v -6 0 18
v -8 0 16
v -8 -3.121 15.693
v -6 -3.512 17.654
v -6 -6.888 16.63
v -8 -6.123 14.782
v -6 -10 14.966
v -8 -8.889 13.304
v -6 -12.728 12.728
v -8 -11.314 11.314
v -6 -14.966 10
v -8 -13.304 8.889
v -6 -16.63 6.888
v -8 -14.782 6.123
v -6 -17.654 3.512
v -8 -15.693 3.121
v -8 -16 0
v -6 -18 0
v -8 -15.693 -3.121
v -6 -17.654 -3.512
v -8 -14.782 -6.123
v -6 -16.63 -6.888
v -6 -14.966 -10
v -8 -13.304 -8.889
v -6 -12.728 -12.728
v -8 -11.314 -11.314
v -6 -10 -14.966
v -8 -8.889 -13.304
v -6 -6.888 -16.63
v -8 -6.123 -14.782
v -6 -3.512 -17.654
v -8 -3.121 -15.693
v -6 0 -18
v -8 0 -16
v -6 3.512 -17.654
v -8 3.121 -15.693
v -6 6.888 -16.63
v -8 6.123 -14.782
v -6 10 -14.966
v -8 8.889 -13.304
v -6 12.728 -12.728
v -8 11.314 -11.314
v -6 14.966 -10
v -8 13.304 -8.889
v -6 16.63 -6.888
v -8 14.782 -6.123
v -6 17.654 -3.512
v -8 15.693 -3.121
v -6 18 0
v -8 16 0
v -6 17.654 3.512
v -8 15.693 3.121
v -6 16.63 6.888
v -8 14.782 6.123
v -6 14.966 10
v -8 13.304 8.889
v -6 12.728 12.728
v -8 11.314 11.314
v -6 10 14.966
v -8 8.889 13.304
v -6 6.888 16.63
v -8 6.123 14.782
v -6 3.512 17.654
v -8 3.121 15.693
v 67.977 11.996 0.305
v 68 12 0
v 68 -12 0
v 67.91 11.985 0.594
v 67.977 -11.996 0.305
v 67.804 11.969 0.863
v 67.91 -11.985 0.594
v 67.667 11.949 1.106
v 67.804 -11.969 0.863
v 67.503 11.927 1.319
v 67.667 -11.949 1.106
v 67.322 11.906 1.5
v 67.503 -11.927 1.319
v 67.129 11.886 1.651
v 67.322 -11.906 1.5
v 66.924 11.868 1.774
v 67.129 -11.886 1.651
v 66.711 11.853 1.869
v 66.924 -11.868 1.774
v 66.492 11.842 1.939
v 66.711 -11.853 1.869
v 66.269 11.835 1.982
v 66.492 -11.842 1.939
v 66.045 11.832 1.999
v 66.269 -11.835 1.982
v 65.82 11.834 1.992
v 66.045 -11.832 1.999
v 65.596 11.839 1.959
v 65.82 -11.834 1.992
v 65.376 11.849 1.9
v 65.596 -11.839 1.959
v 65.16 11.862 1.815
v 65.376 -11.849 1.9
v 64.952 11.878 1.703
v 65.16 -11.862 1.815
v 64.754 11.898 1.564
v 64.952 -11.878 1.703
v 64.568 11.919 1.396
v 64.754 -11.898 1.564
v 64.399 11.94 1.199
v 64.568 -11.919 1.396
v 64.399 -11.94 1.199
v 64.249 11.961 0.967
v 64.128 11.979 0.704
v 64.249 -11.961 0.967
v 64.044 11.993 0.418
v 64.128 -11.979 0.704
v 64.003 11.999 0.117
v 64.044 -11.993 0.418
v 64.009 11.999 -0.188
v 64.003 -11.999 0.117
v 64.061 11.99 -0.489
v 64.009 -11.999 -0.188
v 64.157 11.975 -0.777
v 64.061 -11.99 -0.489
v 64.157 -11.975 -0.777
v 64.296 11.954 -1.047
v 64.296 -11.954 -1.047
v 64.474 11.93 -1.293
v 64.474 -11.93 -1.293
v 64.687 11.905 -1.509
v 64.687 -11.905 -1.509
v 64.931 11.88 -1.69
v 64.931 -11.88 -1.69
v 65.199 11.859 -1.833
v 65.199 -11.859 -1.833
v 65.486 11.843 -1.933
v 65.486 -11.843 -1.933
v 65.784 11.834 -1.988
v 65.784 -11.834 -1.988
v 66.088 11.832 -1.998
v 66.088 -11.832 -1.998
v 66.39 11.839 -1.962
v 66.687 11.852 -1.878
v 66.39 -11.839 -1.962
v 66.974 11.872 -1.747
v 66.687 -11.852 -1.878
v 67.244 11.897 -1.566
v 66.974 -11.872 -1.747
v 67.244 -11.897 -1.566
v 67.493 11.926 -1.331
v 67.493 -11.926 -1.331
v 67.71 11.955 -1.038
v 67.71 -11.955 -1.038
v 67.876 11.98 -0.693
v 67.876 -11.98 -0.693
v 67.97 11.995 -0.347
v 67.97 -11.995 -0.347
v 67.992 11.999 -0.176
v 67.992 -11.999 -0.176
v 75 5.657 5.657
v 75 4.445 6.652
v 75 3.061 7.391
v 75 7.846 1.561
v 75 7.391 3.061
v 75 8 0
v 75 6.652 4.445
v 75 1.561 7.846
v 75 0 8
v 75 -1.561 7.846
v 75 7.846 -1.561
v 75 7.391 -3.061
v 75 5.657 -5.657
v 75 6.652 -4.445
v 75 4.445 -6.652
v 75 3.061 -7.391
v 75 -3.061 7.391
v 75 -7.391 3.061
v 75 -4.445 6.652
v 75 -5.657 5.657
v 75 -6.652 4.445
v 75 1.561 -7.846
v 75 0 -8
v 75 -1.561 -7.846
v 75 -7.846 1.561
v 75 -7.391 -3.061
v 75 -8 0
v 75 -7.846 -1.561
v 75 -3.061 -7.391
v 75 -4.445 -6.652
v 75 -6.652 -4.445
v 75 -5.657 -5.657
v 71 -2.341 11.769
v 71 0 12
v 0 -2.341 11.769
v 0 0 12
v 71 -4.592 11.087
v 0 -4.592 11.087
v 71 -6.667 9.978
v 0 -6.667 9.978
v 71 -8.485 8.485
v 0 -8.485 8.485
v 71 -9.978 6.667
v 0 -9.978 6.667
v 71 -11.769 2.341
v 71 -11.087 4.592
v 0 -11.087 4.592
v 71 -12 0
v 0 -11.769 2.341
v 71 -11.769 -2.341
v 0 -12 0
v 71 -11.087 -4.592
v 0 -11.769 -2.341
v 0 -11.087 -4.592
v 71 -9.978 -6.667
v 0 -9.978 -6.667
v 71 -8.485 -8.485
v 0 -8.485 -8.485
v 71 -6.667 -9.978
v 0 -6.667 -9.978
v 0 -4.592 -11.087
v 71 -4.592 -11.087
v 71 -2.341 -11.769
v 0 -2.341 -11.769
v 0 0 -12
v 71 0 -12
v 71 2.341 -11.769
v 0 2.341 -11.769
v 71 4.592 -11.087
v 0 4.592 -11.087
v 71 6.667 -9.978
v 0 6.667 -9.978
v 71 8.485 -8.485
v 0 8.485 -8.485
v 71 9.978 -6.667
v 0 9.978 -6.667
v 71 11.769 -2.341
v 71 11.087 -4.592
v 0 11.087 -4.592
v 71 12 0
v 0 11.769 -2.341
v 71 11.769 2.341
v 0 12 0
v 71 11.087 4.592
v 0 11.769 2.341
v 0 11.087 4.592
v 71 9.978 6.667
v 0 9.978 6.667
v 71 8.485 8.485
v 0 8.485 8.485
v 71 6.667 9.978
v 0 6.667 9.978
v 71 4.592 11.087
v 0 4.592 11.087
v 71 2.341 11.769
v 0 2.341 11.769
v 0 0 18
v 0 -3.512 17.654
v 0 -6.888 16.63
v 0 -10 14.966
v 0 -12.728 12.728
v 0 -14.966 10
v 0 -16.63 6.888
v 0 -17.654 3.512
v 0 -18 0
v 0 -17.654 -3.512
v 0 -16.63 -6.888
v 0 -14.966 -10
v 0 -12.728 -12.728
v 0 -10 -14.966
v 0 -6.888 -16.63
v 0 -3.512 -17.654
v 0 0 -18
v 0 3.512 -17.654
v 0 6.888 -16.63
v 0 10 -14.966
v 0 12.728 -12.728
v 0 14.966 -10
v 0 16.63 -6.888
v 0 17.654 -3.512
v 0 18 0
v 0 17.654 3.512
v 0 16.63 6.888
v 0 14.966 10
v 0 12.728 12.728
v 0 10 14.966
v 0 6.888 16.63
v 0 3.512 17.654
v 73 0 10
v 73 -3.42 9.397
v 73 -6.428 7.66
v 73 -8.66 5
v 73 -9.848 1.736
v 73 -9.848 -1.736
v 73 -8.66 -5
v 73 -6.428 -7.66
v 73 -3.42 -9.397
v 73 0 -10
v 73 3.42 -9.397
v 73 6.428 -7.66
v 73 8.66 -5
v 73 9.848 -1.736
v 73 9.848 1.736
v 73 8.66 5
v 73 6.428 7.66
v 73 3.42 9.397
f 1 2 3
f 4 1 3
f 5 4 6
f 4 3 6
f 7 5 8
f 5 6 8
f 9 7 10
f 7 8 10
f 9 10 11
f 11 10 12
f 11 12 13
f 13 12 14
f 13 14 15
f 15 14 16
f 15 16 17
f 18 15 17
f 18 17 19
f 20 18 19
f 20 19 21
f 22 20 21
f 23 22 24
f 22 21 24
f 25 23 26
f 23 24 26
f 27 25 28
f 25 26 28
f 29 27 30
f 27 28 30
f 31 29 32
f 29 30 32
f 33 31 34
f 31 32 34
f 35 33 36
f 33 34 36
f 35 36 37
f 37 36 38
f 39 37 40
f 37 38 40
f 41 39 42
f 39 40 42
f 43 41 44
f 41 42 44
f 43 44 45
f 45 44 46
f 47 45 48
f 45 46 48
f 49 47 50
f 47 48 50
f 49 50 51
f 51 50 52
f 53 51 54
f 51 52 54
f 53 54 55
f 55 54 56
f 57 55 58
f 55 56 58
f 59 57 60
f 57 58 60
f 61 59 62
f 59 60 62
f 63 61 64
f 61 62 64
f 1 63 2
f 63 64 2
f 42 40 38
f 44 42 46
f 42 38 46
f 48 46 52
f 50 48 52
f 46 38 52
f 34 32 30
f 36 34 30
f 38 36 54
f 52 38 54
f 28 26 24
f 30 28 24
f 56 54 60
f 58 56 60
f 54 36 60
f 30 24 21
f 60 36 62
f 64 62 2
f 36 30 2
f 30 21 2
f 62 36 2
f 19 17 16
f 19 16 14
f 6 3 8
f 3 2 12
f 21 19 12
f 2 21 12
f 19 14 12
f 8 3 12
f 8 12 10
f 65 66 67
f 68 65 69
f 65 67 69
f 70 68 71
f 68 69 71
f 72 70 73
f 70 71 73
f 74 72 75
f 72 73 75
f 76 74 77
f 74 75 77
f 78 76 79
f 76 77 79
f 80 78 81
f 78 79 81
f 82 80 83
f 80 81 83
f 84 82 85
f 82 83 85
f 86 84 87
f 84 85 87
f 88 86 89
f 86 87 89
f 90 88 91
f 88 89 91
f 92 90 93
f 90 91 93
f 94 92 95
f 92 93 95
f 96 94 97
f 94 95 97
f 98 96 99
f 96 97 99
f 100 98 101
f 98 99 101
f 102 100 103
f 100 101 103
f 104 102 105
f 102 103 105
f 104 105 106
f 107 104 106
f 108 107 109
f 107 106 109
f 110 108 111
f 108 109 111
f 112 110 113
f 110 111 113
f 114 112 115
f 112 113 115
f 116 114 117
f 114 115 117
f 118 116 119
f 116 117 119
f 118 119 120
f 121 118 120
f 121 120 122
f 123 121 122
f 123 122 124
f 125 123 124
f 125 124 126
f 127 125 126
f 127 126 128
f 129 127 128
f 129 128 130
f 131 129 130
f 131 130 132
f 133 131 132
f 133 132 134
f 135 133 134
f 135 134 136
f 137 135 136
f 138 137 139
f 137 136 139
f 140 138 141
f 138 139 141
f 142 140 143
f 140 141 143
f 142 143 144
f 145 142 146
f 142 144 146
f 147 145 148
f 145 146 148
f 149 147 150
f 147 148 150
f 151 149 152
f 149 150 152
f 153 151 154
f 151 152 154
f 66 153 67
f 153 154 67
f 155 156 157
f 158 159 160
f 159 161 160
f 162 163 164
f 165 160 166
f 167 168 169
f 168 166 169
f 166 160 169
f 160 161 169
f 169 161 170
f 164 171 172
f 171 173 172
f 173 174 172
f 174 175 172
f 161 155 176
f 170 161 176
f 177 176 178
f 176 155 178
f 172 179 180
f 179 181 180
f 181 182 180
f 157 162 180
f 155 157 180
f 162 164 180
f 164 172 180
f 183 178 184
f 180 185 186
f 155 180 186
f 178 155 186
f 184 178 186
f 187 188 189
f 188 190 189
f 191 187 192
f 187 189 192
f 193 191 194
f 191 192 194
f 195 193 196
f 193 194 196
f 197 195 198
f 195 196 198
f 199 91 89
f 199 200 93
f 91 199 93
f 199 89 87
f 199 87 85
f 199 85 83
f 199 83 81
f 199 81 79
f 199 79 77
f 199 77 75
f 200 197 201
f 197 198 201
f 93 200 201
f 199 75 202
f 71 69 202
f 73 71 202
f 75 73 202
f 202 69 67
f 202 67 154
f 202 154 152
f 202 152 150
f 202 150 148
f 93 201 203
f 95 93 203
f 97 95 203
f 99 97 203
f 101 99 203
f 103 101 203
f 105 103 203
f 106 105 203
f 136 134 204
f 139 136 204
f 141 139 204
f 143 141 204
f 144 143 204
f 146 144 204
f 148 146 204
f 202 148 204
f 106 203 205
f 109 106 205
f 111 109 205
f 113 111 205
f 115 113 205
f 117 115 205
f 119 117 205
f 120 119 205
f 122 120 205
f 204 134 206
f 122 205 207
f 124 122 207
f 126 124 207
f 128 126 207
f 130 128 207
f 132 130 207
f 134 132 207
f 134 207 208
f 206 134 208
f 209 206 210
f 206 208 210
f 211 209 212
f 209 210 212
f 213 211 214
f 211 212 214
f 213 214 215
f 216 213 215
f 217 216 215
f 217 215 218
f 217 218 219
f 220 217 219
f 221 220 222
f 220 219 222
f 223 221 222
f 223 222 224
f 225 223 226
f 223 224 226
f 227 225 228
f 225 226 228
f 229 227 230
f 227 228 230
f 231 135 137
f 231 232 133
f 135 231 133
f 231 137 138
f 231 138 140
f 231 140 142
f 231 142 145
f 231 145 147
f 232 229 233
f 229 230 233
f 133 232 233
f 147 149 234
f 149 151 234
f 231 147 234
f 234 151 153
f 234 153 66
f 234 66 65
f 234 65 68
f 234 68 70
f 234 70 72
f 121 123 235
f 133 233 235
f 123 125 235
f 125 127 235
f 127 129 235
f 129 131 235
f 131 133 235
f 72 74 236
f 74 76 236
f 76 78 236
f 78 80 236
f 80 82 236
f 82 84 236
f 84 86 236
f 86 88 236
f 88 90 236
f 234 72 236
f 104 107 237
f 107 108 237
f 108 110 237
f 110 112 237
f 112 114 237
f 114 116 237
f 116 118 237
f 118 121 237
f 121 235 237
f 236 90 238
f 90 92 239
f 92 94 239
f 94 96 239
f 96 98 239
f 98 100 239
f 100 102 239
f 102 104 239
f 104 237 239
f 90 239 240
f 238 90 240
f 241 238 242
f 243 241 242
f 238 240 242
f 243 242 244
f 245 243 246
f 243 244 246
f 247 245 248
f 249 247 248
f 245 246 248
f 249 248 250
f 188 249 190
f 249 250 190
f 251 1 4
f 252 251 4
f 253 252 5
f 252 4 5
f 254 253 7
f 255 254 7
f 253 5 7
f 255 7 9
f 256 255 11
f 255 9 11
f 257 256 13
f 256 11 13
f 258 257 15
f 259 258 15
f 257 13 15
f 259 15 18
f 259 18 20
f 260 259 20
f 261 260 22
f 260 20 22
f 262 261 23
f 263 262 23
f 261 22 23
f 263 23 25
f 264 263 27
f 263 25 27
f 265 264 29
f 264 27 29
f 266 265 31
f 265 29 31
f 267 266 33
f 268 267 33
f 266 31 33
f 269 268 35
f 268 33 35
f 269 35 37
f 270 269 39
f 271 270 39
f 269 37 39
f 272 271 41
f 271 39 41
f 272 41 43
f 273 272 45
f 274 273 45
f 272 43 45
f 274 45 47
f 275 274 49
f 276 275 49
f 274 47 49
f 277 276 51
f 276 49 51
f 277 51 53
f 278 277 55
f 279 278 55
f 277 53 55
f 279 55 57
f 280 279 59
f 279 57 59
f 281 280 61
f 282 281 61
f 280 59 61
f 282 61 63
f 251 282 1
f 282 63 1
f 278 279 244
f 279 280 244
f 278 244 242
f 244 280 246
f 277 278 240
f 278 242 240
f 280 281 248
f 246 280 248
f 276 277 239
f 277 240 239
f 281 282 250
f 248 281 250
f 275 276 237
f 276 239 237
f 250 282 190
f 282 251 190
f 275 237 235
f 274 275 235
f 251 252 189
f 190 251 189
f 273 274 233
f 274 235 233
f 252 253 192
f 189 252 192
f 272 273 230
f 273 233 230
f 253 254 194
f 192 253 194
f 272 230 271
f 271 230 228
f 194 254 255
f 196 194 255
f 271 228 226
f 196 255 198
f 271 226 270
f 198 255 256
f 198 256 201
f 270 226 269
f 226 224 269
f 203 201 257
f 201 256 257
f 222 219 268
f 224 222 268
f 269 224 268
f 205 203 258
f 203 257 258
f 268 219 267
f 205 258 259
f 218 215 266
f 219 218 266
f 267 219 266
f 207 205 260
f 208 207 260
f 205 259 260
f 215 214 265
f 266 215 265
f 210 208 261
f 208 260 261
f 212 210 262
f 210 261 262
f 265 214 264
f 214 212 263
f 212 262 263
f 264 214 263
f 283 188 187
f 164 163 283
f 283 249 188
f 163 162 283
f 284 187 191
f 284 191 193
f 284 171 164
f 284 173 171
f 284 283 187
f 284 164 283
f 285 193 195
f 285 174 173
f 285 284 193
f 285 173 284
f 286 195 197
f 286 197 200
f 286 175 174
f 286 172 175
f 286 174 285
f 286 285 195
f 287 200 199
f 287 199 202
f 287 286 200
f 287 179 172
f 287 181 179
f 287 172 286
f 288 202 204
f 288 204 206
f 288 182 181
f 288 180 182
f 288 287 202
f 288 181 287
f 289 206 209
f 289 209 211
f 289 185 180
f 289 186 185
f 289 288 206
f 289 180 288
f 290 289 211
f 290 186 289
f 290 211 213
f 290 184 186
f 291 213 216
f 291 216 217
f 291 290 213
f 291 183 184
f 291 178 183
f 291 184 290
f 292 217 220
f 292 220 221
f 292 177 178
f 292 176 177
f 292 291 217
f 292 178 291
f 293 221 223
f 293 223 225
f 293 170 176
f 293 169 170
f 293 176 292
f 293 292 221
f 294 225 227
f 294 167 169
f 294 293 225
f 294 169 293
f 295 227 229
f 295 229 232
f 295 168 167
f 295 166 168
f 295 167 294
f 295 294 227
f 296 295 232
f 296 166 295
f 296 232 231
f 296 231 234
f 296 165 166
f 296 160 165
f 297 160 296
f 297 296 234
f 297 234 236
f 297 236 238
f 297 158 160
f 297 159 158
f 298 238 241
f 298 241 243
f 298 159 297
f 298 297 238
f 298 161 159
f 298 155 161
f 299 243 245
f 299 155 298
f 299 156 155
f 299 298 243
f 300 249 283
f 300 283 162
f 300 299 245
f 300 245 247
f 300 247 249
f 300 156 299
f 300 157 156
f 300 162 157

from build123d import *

# Parameters (mm, degrees)
F2_SIZE  = 4
F3_SIZE  = 2
F4_R     = 2
F5_DEPTH = 12.5


with BuildPart() as f1:
    # F0 (on Front) → F1 (revolve)
    with BuildSketch(Plane.XZ):
        Polygon((75, 12), (0, 12), (0, 18), (-8, 18), (-8, 0), (75, 0), align=None)
    revolve(axis=Axis((33.5, 0, 0), (1, 0, 0)))

    # F2
    f2_edges = [f1.edges().sort_by_distance(p)[0] for p in [
        (75, 0, -12),
    ]]
    chamfer(f2_edges, length=F2_SIZE)

    # F3
    f3_edges = [f1.edges().sort_by_distance(p)[0] for p in [
        (-8, 0, -18),
    ]]
    chamfer(f3_edges, length=F3_SIZE)

    # F4 (on Front) → F5 (cut, symmetric)
    with BuildSketch(Plane.XZ):
        with Locations((66, 0)):
            Circle(F4_R)
    extrude(amount=F5_DEPTH, both=True, mode=Mode.SUBTRACT)


solid = f1.part
